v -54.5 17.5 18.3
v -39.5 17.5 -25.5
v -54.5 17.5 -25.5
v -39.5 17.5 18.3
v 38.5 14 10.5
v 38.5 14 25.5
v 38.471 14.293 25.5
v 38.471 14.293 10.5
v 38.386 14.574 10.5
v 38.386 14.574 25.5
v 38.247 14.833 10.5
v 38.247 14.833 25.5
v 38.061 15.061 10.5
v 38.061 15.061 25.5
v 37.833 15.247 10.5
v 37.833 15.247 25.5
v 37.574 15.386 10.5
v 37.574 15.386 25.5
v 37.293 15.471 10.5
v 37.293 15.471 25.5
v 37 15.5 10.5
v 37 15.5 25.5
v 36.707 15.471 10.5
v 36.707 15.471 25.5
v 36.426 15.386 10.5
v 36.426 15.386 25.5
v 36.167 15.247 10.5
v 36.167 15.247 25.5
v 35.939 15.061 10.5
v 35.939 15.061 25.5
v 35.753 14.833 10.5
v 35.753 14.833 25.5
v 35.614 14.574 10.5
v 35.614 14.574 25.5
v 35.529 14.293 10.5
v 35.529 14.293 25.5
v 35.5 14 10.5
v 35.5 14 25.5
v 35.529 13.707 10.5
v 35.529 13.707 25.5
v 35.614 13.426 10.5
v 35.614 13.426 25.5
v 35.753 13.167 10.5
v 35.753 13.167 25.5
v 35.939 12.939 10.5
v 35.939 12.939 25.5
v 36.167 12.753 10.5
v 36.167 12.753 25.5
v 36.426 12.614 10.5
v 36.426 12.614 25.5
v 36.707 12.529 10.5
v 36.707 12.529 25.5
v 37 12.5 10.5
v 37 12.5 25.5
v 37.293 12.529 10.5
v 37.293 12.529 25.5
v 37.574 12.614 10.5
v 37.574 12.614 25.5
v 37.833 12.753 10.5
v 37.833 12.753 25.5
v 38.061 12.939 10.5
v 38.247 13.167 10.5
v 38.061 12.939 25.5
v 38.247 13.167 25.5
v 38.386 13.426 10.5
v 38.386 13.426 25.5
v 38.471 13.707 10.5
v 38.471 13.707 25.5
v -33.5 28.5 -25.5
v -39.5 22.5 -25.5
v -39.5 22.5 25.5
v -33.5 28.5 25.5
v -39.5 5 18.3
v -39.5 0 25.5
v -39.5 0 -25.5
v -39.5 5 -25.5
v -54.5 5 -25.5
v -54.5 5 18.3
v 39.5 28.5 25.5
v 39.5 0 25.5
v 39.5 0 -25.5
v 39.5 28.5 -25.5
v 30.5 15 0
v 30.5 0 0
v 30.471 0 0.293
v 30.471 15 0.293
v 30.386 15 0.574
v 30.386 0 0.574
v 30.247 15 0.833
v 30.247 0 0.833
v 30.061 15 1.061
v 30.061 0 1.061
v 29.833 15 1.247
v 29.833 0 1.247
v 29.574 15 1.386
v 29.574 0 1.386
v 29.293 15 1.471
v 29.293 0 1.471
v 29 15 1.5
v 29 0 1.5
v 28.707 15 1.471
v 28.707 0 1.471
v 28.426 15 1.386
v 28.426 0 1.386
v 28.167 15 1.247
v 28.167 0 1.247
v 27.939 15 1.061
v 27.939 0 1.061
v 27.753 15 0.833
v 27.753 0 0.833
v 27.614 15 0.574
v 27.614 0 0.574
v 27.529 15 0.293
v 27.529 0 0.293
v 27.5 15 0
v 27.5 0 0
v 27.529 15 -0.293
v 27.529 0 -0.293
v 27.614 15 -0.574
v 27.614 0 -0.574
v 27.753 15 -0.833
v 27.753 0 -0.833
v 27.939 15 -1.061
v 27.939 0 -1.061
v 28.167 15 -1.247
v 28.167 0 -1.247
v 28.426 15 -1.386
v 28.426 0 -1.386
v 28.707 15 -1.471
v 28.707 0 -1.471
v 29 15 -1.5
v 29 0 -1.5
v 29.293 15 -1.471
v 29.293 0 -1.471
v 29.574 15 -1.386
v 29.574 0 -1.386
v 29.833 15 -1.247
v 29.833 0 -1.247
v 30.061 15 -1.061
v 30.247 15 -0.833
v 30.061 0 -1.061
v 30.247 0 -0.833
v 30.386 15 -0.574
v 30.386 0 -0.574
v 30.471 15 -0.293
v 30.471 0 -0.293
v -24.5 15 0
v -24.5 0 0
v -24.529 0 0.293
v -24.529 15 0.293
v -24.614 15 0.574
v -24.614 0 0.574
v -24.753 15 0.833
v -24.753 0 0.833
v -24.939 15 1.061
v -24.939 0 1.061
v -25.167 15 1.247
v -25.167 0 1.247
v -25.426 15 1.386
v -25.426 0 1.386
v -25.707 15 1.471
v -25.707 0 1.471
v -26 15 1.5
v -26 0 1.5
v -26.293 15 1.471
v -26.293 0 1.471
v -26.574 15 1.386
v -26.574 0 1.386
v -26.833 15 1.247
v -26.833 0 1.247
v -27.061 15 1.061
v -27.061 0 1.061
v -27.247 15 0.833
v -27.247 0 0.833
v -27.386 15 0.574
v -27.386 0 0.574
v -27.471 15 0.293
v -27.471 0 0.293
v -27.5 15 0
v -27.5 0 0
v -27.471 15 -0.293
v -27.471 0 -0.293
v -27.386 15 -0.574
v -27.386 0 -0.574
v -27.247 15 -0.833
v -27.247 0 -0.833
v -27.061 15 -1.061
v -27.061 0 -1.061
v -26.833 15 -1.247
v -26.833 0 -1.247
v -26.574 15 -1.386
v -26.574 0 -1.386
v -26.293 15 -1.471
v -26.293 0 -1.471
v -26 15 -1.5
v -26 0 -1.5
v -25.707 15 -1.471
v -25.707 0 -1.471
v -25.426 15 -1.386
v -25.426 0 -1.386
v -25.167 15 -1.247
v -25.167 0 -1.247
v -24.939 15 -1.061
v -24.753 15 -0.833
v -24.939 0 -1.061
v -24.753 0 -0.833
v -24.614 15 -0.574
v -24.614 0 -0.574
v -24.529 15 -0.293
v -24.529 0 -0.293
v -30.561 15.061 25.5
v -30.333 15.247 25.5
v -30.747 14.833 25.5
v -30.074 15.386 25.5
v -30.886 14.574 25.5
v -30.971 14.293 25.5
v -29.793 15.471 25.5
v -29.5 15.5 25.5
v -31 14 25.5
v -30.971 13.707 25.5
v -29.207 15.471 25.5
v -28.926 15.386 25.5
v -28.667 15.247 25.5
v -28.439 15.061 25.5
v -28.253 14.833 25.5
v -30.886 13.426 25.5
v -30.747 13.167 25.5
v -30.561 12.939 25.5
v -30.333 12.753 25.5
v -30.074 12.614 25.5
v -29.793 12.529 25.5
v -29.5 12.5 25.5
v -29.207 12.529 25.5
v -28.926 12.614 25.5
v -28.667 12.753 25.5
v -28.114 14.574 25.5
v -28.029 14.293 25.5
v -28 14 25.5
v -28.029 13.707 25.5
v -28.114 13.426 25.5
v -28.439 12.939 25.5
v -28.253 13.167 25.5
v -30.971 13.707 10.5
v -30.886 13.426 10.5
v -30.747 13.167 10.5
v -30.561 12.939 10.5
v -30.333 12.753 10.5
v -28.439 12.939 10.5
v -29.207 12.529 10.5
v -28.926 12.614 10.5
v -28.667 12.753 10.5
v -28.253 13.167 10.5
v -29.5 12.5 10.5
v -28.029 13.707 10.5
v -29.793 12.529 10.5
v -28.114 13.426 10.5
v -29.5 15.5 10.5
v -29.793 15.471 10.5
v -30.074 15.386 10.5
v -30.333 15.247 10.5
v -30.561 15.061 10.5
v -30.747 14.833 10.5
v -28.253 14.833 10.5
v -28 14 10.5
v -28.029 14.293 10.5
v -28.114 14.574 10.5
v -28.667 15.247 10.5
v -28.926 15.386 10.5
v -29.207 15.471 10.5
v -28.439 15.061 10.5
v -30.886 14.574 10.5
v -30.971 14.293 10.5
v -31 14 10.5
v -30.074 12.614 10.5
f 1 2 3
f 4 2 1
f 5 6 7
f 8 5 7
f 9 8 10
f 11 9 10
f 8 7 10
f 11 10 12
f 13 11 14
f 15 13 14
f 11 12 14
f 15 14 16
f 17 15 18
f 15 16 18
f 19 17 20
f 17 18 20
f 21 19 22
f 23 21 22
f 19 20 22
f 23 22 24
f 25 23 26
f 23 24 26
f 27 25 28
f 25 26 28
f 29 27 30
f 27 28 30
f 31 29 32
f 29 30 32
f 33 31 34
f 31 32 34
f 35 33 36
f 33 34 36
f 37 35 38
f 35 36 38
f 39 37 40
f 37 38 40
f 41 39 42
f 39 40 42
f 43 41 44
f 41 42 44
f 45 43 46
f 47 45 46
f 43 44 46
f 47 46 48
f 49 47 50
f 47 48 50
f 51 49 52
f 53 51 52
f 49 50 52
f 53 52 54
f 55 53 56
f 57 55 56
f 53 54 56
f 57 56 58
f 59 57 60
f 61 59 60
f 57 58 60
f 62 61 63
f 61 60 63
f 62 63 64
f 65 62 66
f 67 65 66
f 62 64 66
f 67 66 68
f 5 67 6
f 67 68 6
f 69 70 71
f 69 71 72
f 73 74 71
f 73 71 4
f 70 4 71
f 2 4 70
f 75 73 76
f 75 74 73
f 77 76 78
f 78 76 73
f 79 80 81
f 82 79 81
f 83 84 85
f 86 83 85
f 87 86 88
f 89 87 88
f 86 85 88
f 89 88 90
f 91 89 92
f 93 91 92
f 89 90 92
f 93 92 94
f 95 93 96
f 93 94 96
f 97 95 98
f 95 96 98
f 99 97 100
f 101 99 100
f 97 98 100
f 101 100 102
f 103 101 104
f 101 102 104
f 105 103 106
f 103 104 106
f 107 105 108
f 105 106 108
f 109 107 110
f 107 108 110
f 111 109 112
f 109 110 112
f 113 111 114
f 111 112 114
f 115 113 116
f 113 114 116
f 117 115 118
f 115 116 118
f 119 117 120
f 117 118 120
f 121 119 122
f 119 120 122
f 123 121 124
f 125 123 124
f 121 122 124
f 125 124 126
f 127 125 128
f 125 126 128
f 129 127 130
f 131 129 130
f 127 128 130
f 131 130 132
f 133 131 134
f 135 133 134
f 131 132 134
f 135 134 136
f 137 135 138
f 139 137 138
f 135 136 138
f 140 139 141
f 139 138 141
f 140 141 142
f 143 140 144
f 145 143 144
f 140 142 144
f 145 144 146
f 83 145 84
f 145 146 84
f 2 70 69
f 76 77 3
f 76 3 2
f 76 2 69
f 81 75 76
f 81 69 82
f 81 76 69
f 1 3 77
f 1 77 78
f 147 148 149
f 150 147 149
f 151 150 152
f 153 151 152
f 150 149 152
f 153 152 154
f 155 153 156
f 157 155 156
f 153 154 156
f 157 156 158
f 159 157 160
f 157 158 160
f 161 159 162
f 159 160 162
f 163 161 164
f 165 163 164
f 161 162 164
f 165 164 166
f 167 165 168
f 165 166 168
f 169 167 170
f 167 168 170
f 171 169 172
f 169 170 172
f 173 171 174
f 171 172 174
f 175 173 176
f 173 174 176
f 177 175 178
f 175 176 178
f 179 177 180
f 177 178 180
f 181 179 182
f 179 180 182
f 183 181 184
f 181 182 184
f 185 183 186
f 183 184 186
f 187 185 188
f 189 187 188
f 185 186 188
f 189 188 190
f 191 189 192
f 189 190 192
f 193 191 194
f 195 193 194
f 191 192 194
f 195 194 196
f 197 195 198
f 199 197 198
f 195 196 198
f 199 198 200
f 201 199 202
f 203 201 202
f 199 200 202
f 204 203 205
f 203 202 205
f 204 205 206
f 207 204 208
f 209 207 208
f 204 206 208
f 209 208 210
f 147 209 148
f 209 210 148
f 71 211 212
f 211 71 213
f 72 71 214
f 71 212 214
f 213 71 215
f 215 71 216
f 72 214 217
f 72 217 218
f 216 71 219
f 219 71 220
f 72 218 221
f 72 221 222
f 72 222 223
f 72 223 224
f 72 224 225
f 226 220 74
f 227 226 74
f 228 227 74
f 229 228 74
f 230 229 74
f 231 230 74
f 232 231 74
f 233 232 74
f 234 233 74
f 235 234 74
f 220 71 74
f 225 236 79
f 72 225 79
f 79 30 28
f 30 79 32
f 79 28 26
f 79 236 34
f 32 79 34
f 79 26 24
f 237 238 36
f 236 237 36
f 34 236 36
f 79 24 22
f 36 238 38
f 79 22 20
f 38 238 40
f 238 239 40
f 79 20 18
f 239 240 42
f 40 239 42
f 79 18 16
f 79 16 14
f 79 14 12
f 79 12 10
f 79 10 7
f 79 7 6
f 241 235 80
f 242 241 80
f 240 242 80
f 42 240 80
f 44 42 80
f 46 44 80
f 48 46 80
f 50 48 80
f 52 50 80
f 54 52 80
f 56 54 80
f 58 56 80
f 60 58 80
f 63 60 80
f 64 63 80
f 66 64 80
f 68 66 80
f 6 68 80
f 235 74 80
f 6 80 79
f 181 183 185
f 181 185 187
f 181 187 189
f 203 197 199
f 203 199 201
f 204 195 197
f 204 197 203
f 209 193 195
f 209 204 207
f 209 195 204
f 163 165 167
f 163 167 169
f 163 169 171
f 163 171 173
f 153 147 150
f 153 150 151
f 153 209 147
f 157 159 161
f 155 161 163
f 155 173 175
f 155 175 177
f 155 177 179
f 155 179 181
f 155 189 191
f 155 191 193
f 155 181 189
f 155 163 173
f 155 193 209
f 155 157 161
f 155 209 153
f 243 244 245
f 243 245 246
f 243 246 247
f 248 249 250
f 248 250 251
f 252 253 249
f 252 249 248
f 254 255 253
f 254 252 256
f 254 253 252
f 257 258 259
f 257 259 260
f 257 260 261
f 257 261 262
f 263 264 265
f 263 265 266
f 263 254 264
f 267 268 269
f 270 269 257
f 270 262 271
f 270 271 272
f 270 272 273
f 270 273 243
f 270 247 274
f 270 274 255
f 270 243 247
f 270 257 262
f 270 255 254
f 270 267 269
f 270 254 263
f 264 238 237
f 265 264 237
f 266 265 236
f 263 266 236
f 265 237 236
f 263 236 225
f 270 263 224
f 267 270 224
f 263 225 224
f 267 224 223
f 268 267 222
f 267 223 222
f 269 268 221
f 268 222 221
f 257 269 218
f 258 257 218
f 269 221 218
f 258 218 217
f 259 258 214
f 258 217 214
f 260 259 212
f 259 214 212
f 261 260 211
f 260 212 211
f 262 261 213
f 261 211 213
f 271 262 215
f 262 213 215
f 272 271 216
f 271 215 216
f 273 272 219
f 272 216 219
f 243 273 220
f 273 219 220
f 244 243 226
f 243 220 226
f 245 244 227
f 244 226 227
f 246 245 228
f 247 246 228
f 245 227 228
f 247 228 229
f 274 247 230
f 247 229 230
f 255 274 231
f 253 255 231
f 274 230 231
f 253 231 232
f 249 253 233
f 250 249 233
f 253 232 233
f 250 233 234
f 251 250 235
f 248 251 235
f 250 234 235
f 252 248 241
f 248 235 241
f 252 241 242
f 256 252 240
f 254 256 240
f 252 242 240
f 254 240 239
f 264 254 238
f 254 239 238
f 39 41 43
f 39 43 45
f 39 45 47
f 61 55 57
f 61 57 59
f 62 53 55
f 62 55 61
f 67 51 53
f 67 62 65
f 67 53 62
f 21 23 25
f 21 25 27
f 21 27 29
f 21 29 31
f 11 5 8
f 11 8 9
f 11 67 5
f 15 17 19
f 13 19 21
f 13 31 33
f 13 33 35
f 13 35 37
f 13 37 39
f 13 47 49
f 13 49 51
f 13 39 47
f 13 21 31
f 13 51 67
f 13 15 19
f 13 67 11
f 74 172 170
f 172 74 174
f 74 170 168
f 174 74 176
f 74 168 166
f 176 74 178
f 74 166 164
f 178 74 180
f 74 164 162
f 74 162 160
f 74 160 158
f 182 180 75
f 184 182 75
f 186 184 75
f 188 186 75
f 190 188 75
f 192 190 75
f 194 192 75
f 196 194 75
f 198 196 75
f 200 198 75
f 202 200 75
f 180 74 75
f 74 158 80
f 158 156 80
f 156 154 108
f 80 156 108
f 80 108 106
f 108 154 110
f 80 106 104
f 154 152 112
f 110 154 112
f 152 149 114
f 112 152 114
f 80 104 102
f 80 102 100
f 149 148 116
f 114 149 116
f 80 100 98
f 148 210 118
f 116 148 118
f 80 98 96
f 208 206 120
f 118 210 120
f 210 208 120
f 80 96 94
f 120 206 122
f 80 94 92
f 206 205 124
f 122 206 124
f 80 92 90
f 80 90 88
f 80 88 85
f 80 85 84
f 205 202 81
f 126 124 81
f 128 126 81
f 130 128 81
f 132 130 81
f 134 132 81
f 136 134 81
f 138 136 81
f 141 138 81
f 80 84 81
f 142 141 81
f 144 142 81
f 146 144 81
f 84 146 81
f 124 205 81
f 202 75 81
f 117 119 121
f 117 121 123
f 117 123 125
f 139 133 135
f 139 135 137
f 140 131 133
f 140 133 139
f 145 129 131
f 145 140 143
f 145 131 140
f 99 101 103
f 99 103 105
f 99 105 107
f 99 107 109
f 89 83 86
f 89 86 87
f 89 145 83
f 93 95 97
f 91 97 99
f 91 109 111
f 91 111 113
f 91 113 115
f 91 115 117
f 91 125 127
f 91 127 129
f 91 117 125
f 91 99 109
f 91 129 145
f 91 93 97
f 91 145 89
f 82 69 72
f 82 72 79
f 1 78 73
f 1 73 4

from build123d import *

# Parameters (mm, degrees)
SKETCH1_W           = 79
SKETCH1_H           = 51
BOSS_EXTRUDE1_DEPTH = 28.5
SKETCH2_W           = 43.8
SKETCH2_H           = 12.5
BOSS_EXTRUDE2_DEPTH = 15
CUT_EXTRUDE1_DEPTH  = 52
SKETCH4_R           = 1.5
CUT_EXTRUDE2_DEPTH  = 15
SKETCH5_R           = 1.5
CUT_EXTRUDE3_DEPTH  = 15


with BuildPart() as part:
    # Sketch1 → Boss-Extrude1 (new body)
    with BuildSketch(Plane(origin=(0, 0, 0), x_dir=(1, 0, 0), z_dir=(0, 1, 0))):
        Rectangle(SKETCH1_W, SKETCH1_H)
    extrude(amount=BOSS_EXTRUDE1_DEPTH)

    # Sketch2 → Boss-Extrude2 (add)
    with BuildSketch(Plane.ZY.offset(39.5)):
        with Locations((-3.6, 11.25)):
            Rectangle(SKETCH2_W, SKETCH2_H)
    extrude(amount=BOSS_EXTRUDE2_DEPTH)

    # Sketch3 → Cut-Extrude1 (cut, through all)
    with BuildSketch(Plane.XY.offset(25.5)):
        Polygon((-39.5, 28.5), (-39.5, 22.5), (-33.5, 28.5), align=None)
    extrude(amount=-CUT_EXTRUDE1_DEPTH, mode=Mode.SUBTRACT)

    # Sketch4 → Cut-Extrude2 (cut)
    with BuildSketch(Plane.XY.offset(25.5)):
        with Locations((-29.5, 14)):
            Circle(SKETCH4_R)
        with Locations((37, 14)):
            Circle(SKETCH4_R)
    extrude(amount=-CUT_EXTRUDE2_DEPTH, mode=Mode.SUBTRACT)

    # Sketch5 → Cut-Extrude3 (cut)
    with BuildSketch(Plane.XZ):
        with Locations((-26, 0)):
            Circle(SKETCH5_R)
        with Locations((29, 0)):
            Circle(SKETCH5_R)
    extrude(amount=-CUT_EXTRUDE3_DEPTH, mode=Mode.SUBTRACT)


solid = part.part
